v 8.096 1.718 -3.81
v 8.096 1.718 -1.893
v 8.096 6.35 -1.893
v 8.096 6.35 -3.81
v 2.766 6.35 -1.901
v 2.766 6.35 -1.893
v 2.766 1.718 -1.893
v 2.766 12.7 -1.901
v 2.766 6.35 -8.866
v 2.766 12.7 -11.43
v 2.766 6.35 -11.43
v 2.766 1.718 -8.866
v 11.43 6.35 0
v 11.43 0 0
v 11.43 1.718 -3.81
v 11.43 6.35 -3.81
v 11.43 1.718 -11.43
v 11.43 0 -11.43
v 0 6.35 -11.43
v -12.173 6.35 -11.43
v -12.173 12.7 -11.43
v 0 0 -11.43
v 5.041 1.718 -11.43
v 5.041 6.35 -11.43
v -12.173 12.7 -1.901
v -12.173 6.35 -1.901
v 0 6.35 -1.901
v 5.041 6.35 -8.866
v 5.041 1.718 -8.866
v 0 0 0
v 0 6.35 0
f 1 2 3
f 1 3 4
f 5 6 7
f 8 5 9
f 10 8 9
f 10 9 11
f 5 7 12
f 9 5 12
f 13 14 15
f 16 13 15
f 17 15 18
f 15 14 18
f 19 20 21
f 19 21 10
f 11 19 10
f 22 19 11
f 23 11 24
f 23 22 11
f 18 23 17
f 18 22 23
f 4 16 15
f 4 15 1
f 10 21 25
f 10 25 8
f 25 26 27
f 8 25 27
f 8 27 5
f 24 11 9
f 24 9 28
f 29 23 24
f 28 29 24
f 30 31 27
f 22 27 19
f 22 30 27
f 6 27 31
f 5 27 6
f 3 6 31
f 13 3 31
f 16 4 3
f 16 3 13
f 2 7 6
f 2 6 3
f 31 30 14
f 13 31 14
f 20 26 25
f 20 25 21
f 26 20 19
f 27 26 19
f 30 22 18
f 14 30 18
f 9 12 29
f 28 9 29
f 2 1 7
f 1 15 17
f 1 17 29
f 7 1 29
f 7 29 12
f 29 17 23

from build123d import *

# Parameters (mm, degrees)
SKETCH1_W           = 11.43
SKETCH1_H           = 11.43
BOSS_EXTRUDE1_DEPTH = 6.35
SKETCH3_W           = 6.389415989
SKETCH3_H           = 4.631950103
CUT_EXTRUDE1_DEPTH  = 7.62
SKETCH4_W           = 5.33014865
SKETCH4_H           = 6.972552684
CUT_EXTRUDE2_DEPTH  = 15.24
SKETCH5_W           = 14.938478928
SKETCH5_H           = 9.529491398
BOSS_EXTRUDE2_DEPTH = 6.35


with BuildPart() as part:
    # Sketch1 → Boss-Extrude1 (new body)
    with BuildSketch(Plane(origin=(0, 0, 0), x_dir=(1, 0, 0), z_dir=(0, 1, 0))):
        with Locations((5.715, 5.715)):
            Rectangle(SKETCH1_W, SKETCH1_H)
    extrude(amount=BOSS_EXTRUDE1_DEPTH)

    # Sketch3 → Cut-Extrude1 (cut)
    with BuildSketch(Plane(origin=(0, 0, -11.43), x_dir=(-1, 0, 0), z_dir=(0, 0, -1))):
        with Locations((-8.235292005, 4.034024949)):
            Rectangle(SKETCH3_W, SKETCH3_H)
    extrude(amount=-CUT_EXTRUDE1_DEPTH, mode=Mode.SUBTRACT)

    # Sketch4 → Cut-Extrude2 (cut)
    with BuildSketch(Plane(origin=(0, 1.718049897, 0), x_dir=(1, 0, 0), z_dir=(0, 1, 0))):
        with Locations((5.430693356, 5.379383443)):
            Rectangle(SKETCH4_W, SKETCH4_H)
    extrude(amount=CUT_EXTRUDE2_DEPTH, mode=Mode.SUBTRACT)

    # Sketch5 → Boss-Extrude2 (add)
    with BuildSketch(Plane(origin=(0, 6.35, 0), x_dir=(1, 0, 0), z_dir=(0, 1, 0))):
        with Locations((-4.703620433, 6.665254301)):
            Rectangle(SKETCH5_W, SKETCH5_H)
    extrude(amount=BOSS_EXTRUDE2_DEPTH)


solid = part.part
